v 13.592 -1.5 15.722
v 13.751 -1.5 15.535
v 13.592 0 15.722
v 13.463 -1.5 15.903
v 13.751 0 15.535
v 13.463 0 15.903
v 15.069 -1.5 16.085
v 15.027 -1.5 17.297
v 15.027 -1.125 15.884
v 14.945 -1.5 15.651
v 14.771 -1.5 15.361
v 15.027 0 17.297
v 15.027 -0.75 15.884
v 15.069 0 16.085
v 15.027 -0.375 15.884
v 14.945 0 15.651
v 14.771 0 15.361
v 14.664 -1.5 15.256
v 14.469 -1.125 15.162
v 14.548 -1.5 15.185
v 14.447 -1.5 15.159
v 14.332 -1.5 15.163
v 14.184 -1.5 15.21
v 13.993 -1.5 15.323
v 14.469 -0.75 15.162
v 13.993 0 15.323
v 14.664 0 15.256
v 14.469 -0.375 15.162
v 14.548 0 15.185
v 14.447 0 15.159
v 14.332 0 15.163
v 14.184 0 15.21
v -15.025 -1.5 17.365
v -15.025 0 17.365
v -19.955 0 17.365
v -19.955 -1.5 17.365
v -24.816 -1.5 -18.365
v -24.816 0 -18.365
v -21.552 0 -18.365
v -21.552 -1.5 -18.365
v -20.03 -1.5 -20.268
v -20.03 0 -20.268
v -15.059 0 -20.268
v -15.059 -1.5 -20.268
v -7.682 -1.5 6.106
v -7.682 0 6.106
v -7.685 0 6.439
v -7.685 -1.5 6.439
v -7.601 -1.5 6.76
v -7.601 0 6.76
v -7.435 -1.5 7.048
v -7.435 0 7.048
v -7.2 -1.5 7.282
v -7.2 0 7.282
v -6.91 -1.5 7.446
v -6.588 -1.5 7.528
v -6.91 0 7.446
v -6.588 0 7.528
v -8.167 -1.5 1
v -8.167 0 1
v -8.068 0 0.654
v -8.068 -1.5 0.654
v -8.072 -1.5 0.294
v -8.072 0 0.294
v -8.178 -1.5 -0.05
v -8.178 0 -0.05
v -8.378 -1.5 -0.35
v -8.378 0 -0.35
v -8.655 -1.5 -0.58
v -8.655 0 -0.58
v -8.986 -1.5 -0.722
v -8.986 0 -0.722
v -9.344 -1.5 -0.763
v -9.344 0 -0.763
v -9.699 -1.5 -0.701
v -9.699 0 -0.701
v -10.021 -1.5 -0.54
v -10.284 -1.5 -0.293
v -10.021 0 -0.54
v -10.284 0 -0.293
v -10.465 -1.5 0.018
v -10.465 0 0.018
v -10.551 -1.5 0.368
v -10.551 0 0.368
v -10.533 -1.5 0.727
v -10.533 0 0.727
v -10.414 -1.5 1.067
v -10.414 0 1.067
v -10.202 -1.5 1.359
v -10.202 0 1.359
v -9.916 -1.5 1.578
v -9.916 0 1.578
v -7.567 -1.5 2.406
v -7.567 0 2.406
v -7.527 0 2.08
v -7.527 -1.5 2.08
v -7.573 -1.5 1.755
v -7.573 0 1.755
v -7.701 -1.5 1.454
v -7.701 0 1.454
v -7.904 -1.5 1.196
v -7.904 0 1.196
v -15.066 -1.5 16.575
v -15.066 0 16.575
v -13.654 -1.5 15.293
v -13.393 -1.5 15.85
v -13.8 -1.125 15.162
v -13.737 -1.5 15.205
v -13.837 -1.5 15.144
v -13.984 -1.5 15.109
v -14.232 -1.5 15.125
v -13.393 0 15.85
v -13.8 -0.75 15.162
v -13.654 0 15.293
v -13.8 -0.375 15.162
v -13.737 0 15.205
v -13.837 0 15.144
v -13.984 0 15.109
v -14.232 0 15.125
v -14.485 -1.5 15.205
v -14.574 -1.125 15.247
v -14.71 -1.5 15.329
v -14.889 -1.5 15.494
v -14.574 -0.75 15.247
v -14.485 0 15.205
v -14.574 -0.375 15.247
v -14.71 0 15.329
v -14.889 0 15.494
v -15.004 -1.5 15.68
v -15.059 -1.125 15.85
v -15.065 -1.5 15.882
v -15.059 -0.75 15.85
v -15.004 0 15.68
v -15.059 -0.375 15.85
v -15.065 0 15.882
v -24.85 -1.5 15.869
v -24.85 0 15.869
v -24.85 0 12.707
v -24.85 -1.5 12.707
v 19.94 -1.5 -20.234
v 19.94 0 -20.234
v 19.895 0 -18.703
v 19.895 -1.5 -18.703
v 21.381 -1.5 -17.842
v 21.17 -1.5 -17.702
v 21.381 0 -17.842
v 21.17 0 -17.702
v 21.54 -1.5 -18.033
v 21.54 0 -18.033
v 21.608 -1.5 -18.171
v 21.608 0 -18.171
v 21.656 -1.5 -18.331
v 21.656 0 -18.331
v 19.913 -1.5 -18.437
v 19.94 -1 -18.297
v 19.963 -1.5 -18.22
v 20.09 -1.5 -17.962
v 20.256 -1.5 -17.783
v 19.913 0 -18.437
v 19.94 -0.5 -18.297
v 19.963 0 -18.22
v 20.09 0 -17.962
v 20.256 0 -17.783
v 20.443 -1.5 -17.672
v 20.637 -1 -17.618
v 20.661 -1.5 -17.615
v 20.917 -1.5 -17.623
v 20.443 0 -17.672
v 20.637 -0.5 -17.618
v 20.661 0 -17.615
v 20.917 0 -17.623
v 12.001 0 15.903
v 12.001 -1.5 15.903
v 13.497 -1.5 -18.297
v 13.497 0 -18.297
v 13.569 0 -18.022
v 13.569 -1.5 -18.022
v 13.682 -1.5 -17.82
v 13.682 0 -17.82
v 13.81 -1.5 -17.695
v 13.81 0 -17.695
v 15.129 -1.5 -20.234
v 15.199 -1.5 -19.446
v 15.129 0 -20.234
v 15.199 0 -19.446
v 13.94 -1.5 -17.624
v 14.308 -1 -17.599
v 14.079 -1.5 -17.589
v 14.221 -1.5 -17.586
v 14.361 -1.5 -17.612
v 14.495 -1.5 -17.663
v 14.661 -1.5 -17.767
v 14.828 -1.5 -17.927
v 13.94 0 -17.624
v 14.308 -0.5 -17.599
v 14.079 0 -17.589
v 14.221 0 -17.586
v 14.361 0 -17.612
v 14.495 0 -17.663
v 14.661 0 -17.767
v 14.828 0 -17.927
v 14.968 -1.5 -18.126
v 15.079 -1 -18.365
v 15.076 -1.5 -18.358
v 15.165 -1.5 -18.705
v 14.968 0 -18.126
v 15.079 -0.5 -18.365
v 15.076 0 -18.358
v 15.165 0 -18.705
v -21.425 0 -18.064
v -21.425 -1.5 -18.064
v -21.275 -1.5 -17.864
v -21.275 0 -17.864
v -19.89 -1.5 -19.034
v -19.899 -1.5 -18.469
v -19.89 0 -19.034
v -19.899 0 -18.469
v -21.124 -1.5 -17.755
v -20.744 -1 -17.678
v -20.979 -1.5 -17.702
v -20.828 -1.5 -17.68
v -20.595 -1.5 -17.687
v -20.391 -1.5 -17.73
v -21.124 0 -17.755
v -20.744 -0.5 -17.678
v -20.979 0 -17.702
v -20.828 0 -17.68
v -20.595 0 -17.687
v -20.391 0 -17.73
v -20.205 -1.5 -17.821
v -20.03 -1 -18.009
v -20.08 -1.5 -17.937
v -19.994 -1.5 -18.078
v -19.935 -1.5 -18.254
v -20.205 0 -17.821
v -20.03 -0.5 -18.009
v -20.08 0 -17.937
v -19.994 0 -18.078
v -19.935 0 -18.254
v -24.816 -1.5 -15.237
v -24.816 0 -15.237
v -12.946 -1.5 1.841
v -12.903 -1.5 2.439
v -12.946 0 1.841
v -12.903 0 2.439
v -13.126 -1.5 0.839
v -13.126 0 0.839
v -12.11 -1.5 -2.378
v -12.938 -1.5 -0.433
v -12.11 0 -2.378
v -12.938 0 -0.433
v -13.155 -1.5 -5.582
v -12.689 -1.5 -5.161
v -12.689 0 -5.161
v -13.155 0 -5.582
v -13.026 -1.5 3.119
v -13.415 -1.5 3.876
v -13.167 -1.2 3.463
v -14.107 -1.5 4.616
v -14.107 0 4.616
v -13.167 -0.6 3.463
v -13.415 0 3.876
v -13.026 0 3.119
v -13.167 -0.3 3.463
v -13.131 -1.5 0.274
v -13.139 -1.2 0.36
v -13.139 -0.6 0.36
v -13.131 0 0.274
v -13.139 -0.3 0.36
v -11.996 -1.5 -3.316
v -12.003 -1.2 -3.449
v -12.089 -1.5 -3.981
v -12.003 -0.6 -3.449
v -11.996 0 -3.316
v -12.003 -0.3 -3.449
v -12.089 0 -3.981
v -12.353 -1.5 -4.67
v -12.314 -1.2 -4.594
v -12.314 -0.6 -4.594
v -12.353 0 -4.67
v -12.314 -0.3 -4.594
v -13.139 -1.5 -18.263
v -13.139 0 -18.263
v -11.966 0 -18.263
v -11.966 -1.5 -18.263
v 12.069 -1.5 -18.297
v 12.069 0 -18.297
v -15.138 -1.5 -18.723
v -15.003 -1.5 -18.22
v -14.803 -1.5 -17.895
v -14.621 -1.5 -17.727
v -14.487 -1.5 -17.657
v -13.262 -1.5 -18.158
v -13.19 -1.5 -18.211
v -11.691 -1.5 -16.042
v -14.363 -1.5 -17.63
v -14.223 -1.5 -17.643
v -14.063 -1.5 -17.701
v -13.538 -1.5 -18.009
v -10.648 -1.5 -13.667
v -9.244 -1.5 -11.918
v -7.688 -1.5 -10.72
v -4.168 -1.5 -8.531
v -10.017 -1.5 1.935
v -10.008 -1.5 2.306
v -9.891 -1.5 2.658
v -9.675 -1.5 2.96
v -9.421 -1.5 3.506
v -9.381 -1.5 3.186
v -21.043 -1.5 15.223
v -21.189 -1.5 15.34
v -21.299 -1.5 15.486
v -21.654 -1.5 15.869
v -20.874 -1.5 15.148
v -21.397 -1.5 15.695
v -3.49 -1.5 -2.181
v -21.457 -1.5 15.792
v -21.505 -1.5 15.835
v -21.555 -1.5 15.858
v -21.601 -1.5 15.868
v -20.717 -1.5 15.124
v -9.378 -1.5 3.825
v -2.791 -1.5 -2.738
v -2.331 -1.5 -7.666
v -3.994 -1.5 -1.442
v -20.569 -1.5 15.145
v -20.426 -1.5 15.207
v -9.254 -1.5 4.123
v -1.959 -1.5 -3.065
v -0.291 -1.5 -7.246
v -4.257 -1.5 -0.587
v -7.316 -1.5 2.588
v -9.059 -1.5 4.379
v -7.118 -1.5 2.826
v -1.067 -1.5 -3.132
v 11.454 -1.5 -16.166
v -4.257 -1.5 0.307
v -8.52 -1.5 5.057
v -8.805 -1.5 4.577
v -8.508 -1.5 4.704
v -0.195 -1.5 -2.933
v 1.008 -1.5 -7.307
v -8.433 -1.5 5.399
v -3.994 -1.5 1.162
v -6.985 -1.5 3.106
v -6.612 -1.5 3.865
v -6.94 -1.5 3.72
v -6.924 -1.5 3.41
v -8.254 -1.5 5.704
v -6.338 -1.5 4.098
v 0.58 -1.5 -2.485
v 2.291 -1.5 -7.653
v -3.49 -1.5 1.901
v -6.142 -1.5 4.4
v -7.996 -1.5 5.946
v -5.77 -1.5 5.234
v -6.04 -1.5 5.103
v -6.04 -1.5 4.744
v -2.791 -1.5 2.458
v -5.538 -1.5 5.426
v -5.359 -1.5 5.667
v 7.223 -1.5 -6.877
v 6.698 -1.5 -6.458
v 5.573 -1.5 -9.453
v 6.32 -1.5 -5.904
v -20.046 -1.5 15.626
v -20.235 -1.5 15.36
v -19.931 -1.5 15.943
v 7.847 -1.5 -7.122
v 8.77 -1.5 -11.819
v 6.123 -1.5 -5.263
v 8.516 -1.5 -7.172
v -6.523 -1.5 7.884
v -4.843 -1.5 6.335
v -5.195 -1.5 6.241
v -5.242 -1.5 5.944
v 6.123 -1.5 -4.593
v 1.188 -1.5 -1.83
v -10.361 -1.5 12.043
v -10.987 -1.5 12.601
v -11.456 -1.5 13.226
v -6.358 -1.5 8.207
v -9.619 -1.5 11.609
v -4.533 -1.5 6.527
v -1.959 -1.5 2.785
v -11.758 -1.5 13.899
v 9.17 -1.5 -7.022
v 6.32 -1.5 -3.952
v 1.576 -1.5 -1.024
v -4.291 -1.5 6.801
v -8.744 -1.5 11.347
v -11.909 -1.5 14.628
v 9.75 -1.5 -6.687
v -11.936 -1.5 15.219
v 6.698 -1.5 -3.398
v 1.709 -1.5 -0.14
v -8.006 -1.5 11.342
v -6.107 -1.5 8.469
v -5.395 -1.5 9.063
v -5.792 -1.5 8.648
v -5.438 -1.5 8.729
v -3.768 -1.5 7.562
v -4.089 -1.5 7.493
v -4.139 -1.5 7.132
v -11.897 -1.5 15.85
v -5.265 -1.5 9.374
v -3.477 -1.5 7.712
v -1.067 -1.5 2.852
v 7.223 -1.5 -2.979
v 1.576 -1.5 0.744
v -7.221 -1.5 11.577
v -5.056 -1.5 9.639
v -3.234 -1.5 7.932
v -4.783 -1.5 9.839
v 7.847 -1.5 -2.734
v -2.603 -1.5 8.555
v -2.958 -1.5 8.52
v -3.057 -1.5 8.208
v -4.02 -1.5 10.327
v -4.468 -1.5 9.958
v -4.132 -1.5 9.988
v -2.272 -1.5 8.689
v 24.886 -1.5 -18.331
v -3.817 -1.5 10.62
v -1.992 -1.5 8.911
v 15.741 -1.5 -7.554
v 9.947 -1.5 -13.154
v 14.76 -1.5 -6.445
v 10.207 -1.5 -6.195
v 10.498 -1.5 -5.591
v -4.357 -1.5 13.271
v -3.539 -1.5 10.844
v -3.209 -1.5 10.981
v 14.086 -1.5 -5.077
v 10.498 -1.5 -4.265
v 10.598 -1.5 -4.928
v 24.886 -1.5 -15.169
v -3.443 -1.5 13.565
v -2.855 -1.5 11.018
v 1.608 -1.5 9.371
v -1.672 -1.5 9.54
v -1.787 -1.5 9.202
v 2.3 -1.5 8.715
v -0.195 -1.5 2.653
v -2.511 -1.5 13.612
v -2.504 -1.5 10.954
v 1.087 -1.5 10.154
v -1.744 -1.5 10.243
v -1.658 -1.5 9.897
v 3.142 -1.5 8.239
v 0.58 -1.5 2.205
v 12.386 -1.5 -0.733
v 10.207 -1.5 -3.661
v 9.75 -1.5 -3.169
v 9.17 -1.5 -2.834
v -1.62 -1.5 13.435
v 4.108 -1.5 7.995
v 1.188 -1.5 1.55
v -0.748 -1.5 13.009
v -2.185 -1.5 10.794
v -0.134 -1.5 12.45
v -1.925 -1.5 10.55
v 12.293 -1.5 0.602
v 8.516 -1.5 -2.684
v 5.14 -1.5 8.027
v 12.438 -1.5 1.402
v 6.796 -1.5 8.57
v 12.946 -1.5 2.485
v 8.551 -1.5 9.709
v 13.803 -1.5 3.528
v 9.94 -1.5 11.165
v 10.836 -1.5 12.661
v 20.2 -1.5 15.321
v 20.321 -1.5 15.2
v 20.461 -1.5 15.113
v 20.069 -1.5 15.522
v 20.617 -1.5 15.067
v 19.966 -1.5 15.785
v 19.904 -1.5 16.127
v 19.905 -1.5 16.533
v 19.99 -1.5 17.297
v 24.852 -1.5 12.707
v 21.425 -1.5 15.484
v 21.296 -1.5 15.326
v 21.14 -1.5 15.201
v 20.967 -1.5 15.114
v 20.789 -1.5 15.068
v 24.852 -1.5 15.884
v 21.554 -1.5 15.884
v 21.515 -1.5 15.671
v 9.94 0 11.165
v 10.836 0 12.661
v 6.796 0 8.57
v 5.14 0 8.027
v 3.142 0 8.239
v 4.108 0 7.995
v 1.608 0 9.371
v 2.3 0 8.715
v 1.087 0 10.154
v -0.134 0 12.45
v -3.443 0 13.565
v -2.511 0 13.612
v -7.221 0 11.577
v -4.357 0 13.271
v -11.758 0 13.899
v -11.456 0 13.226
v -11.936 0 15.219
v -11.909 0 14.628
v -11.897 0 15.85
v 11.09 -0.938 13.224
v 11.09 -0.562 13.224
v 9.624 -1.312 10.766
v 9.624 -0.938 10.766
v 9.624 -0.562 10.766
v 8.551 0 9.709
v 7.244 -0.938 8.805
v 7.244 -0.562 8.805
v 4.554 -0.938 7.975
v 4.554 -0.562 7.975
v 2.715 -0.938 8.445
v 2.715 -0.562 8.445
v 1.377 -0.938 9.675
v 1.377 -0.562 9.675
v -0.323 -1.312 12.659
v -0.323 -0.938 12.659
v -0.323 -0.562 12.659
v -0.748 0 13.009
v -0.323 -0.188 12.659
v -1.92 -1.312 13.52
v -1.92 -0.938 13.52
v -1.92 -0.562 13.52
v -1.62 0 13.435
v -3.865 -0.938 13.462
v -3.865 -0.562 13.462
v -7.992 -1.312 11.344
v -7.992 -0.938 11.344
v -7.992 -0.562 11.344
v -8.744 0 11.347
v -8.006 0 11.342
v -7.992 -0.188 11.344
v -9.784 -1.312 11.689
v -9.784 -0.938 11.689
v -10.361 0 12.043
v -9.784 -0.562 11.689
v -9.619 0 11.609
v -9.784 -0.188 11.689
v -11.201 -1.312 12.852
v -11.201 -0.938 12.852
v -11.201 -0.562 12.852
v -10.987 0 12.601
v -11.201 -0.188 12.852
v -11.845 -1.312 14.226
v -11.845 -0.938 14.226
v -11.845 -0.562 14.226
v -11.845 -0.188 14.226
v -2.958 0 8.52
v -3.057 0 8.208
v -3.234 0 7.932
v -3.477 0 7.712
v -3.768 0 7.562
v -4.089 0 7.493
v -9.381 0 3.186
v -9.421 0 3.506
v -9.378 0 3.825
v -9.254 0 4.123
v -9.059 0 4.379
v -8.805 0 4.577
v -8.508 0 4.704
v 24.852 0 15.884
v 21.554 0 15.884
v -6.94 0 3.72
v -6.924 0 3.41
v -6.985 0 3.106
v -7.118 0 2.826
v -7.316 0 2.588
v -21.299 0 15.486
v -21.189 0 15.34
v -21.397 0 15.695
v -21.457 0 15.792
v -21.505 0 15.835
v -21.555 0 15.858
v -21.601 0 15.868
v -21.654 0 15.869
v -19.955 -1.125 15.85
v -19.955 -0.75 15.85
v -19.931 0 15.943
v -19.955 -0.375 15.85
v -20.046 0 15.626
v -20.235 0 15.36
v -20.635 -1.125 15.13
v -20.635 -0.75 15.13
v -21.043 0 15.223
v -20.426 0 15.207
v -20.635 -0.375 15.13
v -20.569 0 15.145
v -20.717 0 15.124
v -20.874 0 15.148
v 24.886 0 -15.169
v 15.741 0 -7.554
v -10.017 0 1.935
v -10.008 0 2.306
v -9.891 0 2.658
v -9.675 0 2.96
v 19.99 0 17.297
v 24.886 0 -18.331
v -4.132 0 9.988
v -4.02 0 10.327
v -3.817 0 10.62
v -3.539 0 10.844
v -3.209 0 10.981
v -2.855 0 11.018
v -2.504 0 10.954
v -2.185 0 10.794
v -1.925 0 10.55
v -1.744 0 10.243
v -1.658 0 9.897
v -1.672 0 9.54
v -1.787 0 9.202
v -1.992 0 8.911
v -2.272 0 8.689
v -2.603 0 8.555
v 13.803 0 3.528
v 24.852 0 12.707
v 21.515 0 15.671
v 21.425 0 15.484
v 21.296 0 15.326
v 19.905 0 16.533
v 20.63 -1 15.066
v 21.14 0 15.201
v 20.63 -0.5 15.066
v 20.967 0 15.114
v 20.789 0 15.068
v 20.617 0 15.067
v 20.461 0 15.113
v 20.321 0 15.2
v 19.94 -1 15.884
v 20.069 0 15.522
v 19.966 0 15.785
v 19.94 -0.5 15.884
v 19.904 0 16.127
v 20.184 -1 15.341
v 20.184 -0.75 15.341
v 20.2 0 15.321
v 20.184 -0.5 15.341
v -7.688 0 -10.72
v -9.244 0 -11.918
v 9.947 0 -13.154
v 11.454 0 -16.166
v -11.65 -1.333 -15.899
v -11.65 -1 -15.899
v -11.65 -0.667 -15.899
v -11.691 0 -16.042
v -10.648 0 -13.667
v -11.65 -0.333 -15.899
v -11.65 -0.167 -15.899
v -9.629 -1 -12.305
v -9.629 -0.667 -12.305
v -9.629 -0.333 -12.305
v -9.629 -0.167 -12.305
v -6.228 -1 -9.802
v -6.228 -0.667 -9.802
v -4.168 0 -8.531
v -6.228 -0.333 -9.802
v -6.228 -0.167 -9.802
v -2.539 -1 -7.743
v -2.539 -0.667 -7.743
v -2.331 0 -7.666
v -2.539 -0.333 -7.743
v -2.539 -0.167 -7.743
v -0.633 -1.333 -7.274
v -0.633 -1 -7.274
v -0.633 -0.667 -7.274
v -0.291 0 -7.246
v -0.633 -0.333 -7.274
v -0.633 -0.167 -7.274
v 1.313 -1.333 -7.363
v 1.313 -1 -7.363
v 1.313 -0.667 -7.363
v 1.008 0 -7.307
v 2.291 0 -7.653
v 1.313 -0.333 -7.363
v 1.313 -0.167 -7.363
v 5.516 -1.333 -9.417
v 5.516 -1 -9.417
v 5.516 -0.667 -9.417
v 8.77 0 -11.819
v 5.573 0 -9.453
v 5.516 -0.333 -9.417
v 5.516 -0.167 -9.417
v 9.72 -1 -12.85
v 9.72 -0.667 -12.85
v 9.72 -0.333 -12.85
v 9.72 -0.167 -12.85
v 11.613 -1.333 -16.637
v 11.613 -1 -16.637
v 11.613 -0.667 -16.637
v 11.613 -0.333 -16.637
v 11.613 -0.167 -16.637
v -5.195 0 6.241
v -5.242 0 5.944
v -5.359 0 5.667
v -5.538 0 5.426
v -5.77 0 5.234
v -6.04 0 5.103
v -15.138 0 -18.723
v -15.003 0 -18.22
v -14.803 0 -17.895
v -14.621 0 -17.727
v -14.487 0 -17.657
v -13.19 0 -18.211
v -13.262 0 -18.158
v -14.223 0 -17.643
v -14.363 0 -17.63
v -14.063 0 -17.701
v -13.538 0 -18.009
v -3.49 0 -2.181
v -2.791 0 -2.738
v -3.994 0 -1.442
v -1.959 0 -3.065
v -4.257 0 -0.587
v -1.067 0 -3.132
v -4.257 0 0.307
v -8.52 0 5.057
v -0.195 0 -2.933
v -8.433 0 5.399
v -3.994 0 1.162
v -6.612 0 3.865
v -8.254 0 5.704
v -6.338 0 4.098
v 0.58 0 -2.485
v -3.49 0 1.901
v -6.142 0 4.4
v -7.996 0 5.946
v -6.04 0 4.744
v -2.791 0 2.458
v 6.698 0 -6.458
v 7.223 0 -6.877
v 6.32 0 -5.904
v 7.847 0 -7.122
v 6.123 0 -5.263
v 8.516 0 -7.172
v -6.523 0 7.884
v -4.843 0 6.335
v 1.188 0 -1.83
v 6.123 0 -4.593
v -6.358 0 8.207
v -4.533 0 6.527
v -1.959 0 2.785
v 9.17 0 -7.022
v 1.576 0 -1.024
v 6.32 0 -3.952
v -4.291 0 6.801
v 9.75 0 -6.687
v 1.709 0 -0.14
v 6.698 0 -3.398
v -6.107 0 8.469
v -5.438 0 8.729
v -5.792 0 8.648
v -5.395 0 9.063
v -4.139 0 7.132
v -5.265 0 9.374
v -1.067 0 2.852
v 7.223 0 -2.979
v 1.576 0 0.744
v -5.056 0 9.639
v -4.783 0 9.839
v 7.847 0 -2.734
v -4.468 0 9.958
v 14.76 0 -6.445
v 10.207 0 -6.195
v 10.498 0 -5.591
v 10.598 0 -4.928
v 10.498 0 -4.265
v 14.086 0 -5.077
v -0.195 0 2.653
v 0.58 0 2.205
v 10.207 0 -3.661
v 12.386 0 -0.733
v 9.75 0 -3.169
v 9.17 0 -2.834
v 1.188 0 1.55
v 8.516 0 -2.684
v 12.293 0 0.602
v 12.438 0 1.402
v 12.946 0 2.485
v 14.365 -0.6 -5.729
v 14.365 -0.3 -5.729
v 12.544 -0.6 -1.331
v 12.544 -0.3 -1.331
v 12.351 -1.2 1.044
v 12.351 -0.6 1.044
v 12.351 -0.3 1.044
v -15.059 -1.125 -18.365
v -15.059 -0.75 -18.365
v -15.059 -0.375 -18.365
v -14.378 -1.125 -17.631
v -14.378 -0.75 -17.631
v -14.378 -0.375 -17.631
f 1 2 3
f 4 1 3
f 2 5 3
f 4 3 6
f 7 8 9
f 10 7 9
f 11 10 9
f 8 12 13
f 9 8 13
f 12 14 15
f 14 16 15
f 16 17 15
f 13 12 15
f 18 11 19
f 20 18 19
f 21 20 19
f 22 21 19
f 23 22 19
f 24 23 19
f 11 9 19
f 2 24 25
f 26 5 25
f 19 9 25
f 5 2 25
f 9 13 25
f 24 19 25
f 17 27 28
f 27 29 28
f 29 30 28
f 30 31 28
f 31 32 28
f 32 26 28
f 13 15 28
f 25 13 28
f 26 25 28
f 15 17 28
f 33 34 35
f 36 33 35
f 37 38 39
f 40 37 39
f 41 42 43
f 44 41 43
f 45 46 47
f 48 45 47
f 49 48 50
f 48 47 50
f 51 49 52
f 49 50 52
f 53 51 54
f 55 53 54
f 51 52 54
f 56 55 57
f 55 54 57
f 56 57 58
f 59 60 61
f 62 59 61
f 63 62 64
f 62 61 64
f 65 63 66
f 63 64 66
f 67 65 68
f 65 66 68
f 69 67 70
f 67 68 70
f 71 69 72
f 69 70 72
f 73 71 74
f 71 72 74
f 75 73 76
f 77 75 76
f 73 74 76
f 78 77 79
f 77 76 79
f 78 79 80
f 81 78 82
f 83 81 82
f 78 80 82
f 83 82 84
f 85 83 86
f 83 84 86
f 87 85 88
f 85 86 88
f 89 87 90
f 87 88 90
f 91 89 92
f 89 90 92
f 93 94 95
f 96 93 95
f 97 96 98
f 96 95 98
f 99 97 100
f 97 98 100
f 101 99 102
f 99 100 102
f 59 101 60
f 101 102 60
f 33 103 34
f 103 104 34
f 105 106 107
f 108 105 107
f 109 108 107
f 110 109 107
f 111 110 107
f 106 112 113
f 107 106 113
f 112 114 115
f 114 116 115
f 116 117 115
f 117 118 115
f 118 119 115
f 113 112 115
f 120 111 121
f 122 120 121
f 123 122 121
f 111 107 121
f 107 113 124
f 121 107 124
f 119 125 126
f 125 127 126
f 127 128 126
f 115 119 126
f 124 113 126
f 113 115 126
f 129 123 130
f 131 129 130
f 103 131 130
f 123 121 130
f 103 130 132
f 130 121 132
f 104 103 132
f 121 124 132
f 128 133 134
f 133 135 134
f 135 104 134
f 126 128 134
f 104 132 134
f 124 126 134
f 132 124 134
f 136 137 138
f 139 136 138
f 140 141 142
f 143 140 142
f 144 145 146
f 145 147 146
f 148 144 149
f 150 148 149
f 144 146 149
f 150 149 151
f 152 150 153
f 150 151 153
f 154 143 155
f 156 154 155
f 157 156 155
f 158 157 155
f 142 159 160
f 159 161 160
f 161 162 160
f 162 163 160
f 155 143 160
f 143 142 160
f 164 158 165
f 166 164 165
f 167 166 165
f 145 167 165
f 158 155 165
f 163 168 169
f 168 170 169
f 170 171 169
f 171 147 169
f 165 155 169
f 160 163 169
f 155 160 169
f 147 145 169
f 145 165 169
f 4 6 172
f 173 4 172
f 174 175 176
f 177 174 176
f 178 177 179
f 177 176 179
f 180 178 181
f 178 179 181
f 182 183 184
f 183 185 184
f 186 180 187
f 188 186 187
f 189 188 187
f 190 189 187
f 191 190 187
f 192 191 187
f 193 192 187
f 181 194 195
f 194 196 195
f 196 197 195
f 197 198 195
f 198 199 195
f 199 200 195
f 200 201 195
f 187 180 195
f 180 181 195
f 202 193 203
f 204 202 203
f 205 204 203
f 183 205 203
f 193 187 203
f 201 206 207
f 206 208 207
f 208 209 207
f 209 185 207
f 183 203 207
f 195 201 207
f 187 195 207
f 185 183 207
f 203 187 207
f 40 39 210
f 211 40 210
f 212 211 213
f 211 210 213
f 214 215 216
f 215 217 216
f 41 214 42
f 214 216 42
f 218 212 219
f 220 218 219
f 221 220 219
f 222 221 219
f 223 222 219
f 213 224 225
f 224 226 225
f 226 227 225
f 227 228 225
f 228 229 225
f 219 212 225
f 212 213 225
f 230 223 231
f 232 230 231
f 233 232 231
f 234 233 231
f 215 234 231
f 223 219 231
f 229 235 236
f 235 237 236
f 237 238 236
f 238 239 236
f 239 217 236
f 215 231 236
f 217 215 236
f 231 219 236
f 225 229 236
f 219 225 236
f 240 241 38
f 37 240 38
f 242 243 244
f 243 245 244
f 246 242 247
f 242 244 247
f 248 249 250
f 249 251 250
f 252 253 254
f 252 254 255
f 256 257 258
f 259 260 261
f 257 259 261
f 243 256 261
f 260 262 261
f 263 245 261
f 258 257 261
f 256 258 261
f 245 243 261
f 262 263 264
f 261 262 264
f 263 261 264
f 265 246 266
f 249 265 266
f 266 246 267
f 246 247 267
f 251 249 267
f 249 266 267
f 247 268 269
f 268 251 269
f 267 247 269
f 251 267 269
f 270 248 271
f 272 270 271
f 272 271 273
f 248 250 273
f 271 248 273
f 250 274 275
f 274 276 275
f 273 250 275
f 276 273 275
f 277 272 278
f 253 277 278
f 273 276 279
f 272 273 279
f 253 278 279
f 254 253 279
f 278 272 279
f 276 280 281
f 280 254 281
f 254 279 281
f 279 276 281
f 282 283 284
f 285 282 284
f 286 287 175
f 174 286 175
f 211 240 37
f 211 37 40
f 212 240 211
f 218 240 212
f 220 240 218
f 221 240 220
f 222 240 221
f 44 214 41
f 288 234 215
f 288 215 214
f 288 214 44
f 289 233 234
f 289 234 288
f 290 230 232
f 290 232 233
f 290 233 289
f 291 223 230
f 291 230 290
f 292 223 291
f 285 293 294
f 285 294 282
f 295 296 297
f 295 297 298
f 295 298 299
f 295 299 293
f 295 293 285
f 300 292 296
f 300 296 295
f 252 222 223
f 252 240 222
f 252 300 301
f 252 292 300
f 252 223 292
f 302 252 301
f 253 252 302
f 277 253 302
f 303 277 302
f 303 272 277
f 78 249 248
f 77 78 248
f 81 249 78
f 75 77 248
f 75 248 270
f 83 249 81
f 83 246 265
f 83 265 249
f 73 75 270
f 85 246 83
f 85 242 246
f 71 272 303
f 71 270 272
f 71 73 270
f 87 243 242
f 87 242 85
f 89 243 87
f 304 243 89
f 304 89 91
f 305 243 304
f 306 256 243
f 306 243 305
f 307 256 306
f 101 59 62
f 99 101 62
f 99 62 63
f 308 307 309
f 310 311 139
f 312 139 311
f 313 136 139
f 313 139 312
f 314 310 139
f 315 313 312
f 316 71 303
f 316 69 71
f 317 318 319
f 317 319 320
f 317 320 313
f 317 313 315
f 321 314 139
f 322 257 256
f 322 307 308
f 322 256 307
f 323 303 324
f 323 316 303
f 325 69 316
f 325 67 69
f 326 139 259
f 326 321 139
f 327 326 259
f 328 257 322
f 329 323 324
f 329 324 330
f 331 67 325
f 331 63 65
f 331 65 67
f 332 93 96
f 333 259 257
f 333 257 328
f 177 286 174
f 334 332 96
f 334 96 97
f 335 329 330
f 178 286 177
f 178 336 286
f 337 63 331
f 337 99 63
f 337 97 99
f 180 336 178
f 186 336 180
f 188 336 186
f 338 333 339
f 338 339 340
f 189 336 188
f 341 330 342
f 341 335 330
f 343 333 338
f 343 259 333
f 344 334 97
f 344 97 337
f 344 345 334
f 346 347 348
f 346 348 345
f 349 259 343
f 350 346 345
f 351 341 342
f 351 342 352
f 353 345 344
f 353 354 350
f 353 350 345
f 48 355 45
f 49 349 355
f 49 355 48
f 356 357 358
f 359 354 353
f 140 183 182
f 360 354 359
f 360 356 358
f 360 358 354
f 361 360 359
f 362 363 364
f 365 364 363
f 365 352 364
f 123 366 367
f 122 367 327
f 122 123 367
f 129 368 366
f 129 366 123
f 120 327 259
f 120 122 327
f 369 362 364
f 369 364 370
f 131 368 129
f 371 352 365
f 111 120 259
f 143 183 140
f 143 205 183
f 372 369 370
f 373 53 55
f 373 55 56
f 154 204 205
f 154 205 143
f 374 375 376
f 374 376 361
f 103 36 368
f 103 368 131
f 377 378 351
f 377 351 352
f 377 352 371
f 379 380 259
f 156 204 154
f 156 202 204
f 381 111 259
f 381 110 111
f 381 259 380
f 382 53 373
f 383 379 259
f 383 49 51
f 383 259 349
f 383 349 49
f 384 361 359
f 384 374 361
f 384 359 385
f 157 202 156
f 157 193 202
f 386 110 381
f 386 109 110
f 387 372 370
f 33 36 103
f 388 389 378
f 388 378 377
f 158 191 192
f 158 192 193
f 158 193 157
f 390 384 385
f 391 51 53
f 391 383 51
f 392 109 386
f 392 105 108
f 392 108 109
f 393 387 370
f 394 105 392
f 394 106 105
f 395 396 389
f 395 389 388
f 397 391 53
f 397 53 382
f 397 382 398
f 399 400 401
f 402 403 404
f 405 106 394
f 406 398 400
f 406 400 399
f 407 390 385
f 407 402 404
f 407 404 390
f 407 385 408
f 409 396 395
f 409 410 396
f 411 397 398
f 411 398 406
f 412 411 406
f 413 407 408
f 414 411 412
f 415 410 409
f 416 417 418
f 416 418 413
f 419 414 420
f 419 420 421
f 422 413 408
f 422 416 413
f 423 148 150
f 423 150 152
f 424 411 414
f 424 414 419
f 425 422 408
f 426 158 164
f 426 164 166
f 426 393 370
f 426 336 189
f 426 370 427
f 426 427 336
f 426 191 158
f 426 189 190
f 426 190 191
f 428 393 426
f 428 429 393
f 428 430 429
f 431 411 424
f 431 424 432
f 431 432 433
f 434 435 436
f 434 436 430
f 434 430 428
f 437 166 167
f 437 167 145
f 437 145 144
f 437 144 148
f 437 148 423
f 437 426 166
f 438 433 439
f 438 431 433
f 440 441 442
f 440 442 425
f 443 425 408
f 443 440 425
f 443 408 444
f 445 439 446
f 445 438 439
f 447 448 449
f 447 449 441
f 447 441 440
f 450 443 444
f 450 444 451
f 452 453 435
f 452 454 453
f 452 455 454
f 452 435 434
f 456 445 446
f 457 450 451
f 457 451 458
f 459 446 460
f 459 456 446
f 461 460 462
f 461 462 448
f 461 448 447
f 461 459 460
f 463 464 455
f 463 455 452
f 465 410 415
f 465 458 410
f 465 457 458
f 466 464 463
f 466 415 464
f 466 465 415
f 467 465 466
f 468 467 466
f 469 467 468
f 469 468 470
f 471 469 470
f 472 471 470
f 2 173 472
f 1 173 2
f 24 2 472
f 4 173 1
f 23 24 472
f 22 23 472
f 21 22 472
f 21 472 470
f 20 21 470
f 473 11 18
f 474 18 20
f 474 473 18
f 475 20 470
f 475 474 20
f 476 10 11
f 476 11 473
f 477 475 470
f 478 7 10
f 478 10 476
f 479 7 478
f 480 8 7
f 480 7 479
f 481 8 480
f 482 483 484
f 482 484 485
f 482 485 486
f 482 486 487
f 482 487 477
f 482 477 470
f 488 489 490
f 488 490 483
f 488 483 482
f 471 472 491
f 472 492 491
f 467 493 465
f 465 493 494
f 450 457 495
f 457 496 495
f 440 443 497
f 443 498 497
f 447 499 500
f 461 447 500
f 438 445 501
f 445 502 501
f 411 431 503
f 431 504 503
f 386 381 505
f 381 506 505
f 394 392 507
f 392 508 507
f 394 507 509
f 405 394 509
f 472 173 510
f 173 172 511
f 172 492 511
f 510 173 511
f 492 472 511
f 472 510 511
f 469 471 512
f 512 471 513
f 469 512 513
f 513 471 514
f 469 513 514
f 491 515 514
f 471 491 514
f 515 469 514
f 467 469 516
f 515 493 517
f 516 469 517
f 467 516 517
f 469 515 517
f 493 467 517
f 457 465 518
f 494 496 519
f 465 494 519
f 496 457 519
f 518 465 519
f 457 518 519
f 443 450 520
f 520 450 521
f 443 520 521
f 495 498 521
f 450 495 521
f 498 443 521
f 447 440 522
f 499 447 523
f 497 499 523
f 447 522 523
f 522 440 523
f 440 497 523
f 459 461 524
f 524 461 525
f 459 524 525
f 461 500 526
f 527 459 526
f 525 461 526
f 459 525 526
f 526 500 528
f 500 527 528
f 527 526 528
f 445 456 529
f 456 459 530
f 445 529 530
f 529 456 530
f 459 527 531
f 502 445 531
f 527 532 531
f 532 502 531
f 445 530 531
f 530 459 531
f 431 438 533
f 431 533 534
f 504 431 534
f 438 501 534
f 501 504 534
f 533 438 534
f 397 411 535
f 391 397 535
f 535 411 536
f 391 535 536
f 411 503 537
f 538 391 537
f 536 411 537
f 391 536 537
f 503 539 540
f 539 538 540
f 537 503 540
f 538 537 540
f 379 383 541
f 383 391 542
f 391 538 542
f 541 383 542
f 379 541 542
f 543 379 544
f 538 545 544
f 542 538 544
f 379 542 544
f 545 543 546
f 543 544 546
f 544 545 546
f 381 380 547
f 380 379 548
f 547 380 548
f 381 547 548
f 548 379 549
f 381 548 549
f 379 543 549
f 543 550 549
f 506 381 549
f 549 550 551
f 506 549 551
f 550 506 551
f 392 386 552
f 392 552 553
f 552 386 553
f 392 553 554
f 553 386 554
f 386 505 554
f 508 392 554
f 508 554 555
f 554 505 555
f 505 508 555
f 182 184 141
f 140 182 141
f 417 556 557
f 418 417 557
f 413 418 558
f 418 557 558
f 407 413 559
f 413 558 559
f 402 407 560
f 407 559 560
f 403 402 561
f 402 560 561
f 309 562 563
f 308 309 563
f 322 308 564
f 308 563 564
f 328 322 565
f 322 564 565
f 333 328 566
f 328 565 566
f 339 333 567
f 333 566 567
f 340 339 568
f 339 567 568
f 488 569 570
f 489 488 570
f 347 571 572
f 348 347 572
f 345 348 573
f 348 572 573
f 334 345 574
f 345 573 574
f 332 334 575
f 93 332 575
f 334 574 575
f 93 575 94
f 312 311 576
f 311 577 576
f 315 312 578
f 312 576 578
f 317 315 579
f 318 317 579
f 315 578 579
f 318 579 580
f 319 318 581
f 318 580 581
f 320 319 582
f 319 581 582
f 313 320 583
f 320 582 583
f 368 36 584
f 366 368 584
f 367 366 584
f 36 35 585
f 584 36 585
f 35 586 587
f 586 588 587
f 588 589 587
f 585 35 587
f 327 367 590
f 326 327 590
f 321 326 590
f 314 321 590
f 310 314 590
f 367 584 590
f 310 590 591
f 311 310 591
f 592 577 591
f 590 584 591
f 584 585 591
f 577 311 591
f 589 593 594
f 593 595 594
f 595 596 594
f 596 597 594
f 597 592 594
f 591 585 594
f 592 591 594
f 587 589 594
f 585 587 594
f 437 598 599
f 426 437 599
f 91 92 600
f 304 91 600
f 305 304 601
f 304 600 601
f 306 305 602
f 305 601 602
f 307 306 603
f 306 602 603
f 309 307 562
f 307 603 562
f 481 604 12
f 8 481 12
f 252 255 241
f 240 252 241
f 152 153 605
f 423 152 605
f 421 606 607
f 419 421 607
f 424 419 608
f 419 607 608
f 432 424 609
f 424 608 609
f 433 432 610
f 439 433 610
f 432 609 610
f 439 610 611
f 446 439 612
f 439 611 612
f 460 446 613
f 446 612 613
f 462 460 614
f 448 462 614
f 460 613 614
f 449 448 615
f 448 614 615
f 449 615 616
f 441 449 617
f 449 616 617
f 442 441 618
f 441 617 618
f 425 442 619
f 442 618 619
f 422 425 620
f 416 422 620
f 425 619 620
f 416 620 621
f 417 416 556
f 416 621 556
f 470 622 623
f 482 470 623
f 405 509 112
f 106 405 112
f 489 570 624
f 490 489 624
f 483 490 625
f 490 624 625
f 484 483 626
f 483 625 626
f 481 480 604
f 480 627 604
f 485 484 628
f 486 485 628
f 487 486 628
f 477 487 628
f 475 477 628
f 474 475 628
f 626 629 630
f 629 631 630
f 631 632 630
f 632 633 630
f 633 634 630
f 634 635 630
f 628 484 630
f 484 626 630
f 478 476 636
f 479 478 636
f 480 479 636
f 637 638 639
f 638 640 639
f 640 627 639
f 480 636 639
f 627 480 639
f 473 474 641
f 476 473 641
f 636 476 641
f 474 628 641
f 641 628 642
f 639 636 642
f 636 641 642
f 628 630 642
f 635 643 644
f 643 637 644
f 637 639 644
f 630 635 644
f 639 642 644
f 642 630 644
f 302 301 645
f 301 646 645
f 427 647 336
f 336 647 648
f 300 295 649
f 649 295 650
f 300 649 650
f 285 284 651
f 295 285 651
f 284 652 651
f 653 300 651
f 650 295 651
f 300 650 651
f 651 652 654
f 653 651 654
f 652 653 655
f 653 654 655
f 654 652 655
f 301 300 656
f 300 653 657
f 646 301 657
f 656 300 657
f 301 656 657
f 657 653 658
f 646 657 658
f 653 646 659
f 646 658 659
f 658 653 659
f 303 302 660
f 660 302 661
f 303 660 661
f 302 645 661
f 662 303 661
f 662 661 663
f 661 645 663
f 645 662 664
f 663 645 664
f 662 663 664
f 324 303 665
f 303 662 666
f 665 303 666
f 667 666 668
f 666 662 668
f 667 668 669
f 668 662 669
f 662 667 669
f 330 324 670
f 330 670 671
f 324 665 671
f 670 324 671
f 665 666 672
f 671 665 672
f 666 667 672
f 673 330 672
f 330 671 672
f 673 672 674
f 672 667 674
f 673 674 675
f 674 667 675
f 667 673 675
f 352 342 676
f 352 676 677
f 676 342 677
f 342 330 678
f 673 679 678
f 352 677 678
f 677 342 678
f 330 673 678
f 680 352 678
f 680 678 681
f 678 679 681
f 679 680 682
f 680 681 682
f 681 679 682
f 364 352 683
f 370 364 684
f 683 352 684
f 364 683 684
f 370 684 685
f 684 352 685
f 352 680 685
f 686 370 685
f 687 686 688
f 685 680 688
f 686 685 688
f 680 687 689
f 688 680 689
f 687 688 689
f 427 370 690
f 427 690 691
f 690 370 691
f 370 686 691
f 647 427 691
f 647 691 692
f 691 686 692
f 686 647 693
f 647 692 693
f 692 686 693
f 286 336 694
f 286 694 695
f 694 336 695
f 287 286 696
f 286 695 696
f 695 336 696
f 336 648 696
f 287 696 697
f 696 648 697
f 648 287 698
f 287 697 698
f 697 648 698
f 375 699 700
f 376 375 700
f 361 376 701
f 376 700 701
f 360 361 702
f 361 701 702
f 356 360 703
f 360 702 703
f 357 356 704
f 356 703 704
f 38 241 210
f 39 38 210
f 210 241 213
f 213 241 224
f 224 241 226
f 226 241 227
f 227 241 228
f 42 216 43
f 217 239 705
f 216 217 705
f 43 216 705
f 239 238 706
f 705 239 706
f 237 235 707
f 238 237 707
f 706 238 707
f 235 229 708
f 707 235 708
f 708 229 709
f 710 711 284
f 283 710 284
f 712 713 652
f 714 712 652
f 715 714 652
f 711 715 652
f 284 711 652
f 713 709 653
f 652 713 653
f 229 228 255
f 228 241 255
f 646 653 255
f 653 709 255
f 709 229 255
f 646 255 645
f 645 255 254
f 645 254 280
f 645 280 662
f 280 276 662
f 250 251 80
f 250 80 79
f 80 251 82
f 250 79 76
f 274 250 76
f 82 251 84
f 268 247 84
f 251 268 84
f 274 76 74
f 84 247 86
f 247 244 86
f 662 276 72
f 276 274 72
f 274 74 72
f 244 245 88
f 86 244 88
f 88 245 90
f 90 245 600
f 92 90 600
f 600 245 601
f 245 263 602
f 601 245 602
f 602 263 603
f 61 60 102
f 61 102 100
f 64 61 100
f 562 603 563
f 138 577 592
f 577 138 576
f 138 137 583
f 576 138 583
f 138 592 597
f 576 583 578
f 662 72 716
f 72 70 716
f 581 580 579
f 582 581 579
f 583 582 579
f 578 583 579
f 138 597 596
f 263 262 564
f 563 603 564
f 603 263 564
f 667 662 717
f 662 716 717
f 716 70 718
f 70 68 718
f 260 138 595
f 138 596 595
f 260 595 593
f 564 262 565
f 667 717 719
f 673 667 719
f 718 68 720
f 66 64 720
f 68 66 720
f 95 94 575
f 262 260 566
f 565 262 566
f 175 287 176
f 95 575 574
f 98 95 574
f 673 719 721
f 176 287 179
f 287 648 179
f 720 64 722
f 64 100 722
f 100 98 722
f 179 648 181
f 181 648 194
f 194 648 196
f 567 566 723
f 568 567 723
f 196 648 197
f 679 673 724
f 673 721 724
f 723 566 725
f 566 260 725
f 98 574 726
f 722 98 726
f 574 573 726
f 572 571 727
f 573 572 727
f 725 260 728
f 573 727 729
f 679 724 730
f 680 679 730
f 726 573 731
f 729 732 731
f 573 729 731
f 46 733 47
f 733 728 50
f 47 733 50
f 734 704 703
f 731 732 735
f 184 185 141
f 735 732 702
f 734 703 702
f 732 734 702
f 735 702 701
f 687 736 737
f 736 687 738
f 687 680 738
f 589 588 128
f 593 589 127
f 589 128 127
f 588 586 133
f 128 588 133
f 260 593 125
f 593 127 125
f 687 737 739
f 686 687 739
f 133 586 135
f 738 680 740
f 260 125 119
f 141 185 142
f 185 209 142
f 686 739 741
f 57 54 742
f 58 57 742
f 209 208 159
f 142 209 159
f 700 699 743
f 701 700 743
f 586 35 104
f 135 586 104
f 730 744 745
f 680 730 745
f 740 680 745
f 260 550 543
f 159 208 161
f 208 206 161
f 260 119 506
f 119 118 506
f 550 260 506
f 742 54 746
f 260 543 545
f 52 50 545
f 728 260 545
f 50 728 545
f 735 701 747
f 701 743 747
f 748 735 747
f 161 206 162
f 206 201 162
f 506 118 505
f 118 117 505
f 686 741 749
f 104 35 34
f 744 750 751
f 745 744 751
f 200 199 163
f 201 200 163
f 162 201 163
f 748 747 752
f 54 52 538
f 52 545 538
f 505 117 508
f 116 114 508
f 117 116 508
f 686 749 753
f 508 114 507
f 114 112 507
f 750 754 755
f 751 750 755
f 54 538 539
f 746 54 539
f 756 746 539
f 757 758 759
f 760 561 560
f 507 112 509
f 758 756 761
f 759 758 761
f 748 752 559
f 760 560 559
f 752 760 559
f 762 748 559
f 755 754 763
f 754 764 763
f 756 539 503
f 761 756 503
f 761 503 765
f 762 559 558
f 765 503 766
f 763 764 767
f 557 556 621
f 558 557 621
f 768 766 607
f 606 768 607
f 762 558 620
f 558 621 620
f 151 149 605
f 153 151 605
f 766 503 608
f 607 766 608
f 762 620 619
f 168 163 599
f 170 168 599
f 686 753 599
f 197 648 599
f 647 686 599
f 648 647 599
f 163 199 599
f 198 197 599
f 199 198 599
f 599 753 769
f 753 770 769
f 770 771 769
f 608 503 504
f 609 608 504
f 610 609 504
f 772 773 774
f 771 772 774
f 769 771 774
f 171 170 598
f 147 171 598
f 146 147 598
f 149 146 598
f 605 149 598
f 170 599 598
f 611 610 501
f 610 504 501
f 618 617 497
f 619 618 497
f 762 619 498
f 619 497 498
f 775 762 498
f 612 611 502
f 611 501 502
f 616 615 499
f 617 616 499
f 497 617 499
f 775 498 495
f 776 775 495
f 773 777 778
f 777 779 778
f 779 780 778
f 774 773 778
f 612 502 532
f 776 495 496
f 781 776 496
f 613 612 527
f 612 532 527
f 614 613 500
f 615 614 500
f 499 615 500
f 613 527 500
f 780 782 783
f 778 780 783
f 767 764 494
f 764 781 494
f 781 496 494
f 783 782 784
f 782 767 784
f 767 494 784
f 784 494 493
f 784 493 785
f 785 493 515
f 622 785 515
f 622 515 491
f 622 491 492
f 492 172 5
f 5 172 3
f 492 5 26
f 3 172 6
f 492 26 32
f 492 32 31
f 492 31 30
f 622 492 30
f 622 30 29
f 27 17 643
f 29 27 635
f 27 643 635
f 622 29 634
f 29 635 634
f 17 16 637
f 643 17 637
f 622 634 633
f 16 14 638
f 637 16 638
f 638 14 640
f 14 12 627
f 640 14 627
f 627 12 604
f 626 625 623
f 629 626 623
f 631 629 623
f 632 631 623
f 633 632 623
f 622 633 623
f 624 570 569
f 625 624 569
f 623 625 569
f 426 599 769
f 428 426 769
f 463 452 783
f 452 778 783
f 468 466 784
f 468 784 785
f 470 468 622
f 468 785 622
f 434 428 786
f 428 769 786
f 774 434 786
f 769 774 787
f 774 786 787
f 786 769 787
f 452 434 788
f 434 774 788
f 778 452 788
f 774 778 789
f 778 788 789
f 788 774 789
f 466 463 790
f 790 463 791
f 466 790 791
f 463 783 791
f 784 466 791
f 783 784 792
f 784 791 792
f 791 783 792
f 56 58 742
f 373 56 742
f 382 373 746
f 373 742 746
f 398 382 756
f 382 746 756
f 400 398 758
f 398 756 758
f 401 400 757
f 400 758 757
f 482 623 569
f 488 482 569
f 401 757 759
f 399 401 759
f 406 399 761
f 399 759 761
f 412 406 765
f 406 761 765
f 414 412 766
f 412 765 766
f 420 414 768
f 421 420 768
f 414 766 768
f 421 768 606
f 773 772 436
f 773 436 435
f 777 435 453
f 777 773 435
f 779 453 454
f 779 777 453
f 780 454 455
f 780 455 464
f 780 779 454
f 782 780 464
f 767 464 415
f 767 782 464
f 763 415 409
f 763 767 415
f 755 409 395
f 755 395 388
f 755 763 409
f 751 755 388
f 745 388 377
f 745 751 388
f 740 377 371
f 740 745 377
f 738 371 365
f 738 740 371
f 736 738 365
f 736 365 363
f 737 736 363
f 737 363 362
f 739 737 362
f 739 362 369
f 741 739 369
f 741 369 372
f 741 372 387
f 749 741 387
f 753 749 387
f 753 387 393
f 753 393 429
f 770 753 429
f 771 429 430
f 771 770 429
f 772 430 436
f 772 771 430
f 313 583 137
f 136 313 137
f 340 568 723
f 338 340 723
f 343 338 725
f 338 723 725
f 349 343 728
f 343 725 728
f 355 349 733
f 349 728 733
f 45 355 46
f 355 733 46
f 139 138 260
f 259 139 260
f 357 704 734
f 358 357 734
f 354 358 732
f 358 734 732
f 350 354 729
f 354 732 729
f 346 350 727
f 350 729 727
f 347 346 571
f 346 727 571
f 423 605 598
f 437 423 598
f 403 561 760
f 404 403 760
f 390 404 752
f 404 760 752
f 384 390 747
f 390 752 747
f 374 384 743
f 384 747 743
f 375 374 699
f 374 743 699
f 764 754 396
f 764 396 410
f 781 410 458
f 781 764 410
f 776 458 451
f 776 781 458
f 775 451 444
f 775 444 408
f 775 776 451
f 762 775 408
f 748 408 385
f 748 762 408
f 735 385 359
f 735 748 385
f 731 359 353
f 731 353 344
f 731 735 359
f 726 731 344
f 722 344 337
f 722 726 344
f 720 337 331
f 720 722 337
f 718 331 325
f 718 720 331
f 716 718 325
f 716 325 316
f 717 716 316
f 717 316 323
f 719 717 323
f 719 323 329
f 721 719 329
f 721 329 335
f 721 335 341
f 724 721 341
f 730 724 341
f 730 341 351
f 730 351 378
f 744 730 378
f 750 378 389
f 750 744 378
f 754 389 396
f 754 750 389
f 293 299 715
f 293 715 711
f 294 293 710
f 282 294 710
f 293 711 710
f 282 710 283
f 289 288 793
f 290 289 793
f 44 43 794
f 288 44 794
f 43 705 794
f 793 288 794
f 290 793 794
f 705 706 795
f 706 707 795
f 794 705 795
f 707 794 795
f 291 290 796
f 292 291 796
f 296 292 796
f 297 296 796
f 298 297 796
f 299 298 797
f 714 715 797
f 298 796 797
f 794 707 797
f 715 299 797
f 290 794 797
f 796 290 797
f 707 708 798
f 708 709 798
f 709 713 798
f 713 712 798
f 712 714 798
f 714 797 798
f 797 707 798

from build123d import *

# Parameters (mm, degrees)
F0_R     = 2.25
F0_R_2   = 3
F1_DEPTH = 1.5


with BuildPart() as f1:
    # F0 (on Front) → F1 (new body)
    with BuildSketch(Plane.XZ):
        with BuildLine():
            Line((-15.0251509622, 17.3645764589), (-19.9545007199, 17.3645764589))
            add(Edge.make_bspline(
                [(-19.9545007199, 17.3645764589), (-19.9535720667, 16.8131621824), (-19.7168747224, 15.8775874684), (-20.5793013029, 14.9053038169), (-21.3859451314, 15.3877012187), (-21.4138567556, 15.8836599543), (-21.6542761773, 15.8687736839)],
                knots=[0, 0, 0, 0, 0.3221210085, 0.5826458094, 0.8070723447, 1, 1, 1, 1], degree=3))
            Line((-21.6542761773, 15.8687736839), (-24.8498562723, 15.8687736839))
            Line((-24.8498562723, 15.8687736839), (-24.8498562723, 12.7071905881))
            Line((-24.8498562723, 12.7071905881), (-14.1072720289, 4.6162568033))
            add(Edge.make_bspline(
                [(-14.1072720289, 4.6162568033), (-13.2230557501, 3.8683512248), (-12.5955822995, 2.3662194197), (-13.4785055168, 0.3393812838), (-12.2918030886, -1.6116186172), (-11.7680076762, -3.4464893707), (-12.3909122816, -5.045914489), (-13.1553970277, -5.582400132)],
                knots=[0, 0, 0, 0, 0.218757957, 0.4076229901, 0.6044433625, 0.7893669519, 1, 1, 1, 1], degree=3))
            Line((-13.1553970277, -5.582400132), (-24.8158611357, -15.2371283621))
            Line((-24.8158611357, -15.2371283621), (-24.8158611357, -18.3647163212))
            Line((-24.8158611357, -18.3647163212), (-21.5522907674, -18.3647163212))
            add(Edge.make_bspline(
                [(-21.5522907674, -18.3647163212), (-21.3619760825, -17.7734100915), (-20.8040792236, -17.5927453525), (-19.6938703532, -17.8804564704), (-19.907143935, -19.3937320877), (-20.0300551951, -20.268464461)],
                knots=[0, 0, 0, 0, 0.3011288202, 0.5605343257, 1, 1, 1, 1], degree=3))
            Line((-20.0300551951, -20.268464461), (-15.0591470301, -20.268464461))
            add(Edge.make_bspline(
                [(-15.0591470301, -20.268464461), (-15.1428716699, -19.6049301593), (-15.3085890551, -18.4016039255), (-14.4064169123, -17.3792275229), (-13.6721117794, -17.9843845783), (-13.225236245, -18.15011929), (-13.13944906, -18.2627290487)],
                knots=[0, 0, 0, 0, 0.3411243592, 0.5884887653, 0.8102772301, 1, 1, 1, 1], degree=3))
            Line((-13.13944906, -18.2627290487), (-11.9655542076, -18.2627290487))
            add(Edge.make_bspline(
                [(-11.9655542076, -18.2627290487), (-11.9397683925, -17.5240316243), (-11.8626991056, -15.8003195677), (-9.8610237362, -11.9366248831), (-6.2123076845, -9.8606819162), (-2.6903679226, -7.4581272699), (1.4840396874, -6.8942017274), (5.573756912, -9.4160428559), (10.0239991277, -12.3879515301), (11.643280897, -16.5347525517), (11.951625046, -17.8050458649), (12.0692774653, -18.2967241853)],
                knots=[0, 0, 0, 0, 0.0881742675, 0.2041097942, 0.3214365501, 0.4387802752, 0.5511122415, 0.6746033273, 0.8076149426, 0.9250853853, 1, 1, 1, 1], degree=3))
            Line((12.0692774653, -18.2967241853), (13.4970899671, -18.2967241853))
            add(Edge.make_bspline(
                [(13.4970899671, -18.2967241853), (13.5915130377, -17.6864806563), (14.3587578575, -17.3721231317), (15.3138329986, -18.3608847172), (15.2065932408, -19.5730537285), (15.1288751513, -20.2344693244)],
                knots=[0, 0, 0, 0, 0.3003378478, 0.6028982403, 1, 1, 1, 1], degree=3))
            Line((15.1288751513, -20.2344693244), (19.9401732534, -20.2344693244))
            add(Edge.make_bspline(
                [(19.9401732534, -20.2344693244), (20.0081672519, -19.5392370224), (19.6695355791, -18.2998815741), (20.5801616594, -17.3727636932), (21.5387940949, -17.7753876825), (21.6560140252, -18.330719322)],
                knots=[0, 0, 0, 0, 0.3985033086, 0.6808096102, 1, 1, 1, 1], degree=3))
            Line((21.6560140252, -18.330719322), (24.8855892569, -18.330719322))
            Line((24.8855892569, -18.330719322), (24.8855892569, -15.1691362262))
            Line((24.8855892569, -15.1691362262), (15.740795061, -7.5541399419))
            add(Edge.make_bspline(
                [(15.740795061, -7.5541399419), (15.1128116995, -7.0203864016), (14.2610402716, -5.8244149317), (13.4580371253, -3.1665563837), (12.4129123892, -1.4137997358), (12.0762139335, 1.1880408243), (13.0056873075, 2.7284303364), (13.8030489907, 3.5283996258)],
                knots=[0, 0, 0, 0, 0.1930745588, 0.4025940869, 0.5862688664, 0.7833666871, 1, 1, 1, 1], degree=3))
            Line((13.8030489907, 3.5283996258), (24.8515922576, 12.7071896568))
            Line((24.8515922576, 12.7071896568), (24.8515922576, 15.8840939403))
            Line((24.8515922576, 15.8840939403), (21.5540286154, 15.8840939403))
            add(Edge.make_bspline(
                [(21.5540286154, 15.8840939403), (21.5294640511, 15.3656629846), (20.5337165196, 14.7005224714), (19.7483843758, 15.9215821187), (19.9426753933, 16.8238527236), (19.9902337044, 17.2965861857)],
                knots=[0, 0, 0, 0, 0.3332224732, 0.6434516576, 1, 1, 1, 1], degree=3))
            Line((19.9902337044, 17.2965861857), (15.0268878788, 17.2965861857))
            add(Edge.make_bspline(
                [(15.0268878788, 17.2965861857), (15.0871861527, 16.8053287766), (15.1930982311, 15.9356261141), (14.5313218028, 14.9135620801), (13.7594522103, 15.4713059835), (13.556660089, 15.766412366), (13.4630938992, 15.9027688205)],
                knots=[0, 0, 0, 0, 0.317911838, 0.5734347674, 0.8034012952, 1, 1, 1, 1], degree=3))
            Line((13.4630938992, 15.9027688205), (12.0012871921, 15.9027688205))
            add(Edge.make_bspline(
                [(12.0012871921, 15.9027688205), (11.4556535631, 14.0921326001), (10.3565226292, 10.4518996338), (4.6464120547, 7.0283579151), (0.9471679726, 9.3969384427), (0.2399883407, 13.1100056638), (-4.1876584296, 14.2966225813), (-7.7299584292, 10.2752792104), (-11.6908074285, 12.6642568786), (-12.0232174394, 14.6667154103), (-11.8966298178, 15.8500988036)],
                knots=[0, 0, 0, 0, 0.1465590584, 0.2947577084, 0.4116920328, 0.5258589953, 0.6432512693, 0.7759323474, 0.89192575, 1, 1, 1, 1], degree=3))
            Line((-11.8966298178, 15.8500988036), (-13.393365778, 15.8500988036))
            add(Edge.make_bspline(
                [(-13.393365778, 15.8500988036), (-13.5080072019, 15.5723166362), (-13.6784000772, 14.982350744), (-14.6455578559, 15.1844355392), (-15.2435875686, 15.8328844958), (-15.0074686052, 16.8265287767), (-15.0251509622, 17.3645764589)],
                knots=[0, 0, 0, 0, 0.2300074433, 0.4569541416, 0.68335264, 1, 1, 1, 1], degree=3))
        make_face()
        with Locations((8.3475373685, -4.9279744403)):
            Circle(F0_R, mode=Mode.SUBTRACT)
        with Locations((-1.290963497, -0.14)):
            Circle(F0_R_2, mode=Mode.SUBTRACT)
        with BuildLine():
            ThreePointArc((-4.131682264, 9.9881394641), (-1.9249265746, 10.5500303858), (-2.9575211924, 8.5204391866))
            ThreePointArc((-2.9575211924, 8.5204391866), (-3.3480862624, 7.8138236715), (-4.0891277985, 7.4933490205))
            ThreePointArc((-4.0891277985, 7.4933490205), (-4.4021766147, 6.6550527276), (-5.1953643016, 6.2408142342))
            ThreePointArc((-5.1953643016, 6.2408142342), (-5.4411491533, 5.5407481061), (-6.0404504072, 5.1033229308))
            ThreePointArc((-6.0404504072, 5.1033229308), (-6.2295343938, 4.2418164709), (-6.9403458161, 3.7196160722))
            ThreePointArc((-6.9403458161, 3.7196160722), (-7.0425000321, 2.9620011851), (-7.5666955237, 2.4055527262))
            ThreePointArc((-7.5666955237, 2.4055527262), (-7.6271174522, 1.600417658), (-8.1671190931, 1.0001747777))
            ThreePointArc((-8.1671190931, 1.0001747777), (-9.698543548, -0.7006406517), (-9.9161059112, 1.5776702586))
            ThreePointArc((-9.9161059112, 1.5776702586), (-9.962619044, 2.4863215154), (-9.3807834636, 3.1858055648))
            ThreePointArc((-9.3807834636, 3.1858055648), (-9.2544636888, 4.1230055487), (-8.5079487638, 4.7035363075))
            ThreePointArc((-8.5079487638, 4.7035363075), (-8.3543865167, 5.5578534847), (-7.6815101895, 6.1061933896))
            ThreePointArc((-7.6815101895, 6.1061933896), (-7.435447654, 7.0481780154), (-6.5882565067, 7.527916451))
            ThreePointArc((-6.5882565067, 7.527916451), (-6.241767649, 8.3471963981), (-5.4381442807, 8.7285933595))
            ThreePointArc((-5.4381442807, 8.7285933595), (-5.0557690349, 9.6393110826), (-4.131682264, 9.9881394641))
        make_face(mode=Mode.SUBTRACT)
    extrude(amount=F1_DEPTH)


solid = f1.part
